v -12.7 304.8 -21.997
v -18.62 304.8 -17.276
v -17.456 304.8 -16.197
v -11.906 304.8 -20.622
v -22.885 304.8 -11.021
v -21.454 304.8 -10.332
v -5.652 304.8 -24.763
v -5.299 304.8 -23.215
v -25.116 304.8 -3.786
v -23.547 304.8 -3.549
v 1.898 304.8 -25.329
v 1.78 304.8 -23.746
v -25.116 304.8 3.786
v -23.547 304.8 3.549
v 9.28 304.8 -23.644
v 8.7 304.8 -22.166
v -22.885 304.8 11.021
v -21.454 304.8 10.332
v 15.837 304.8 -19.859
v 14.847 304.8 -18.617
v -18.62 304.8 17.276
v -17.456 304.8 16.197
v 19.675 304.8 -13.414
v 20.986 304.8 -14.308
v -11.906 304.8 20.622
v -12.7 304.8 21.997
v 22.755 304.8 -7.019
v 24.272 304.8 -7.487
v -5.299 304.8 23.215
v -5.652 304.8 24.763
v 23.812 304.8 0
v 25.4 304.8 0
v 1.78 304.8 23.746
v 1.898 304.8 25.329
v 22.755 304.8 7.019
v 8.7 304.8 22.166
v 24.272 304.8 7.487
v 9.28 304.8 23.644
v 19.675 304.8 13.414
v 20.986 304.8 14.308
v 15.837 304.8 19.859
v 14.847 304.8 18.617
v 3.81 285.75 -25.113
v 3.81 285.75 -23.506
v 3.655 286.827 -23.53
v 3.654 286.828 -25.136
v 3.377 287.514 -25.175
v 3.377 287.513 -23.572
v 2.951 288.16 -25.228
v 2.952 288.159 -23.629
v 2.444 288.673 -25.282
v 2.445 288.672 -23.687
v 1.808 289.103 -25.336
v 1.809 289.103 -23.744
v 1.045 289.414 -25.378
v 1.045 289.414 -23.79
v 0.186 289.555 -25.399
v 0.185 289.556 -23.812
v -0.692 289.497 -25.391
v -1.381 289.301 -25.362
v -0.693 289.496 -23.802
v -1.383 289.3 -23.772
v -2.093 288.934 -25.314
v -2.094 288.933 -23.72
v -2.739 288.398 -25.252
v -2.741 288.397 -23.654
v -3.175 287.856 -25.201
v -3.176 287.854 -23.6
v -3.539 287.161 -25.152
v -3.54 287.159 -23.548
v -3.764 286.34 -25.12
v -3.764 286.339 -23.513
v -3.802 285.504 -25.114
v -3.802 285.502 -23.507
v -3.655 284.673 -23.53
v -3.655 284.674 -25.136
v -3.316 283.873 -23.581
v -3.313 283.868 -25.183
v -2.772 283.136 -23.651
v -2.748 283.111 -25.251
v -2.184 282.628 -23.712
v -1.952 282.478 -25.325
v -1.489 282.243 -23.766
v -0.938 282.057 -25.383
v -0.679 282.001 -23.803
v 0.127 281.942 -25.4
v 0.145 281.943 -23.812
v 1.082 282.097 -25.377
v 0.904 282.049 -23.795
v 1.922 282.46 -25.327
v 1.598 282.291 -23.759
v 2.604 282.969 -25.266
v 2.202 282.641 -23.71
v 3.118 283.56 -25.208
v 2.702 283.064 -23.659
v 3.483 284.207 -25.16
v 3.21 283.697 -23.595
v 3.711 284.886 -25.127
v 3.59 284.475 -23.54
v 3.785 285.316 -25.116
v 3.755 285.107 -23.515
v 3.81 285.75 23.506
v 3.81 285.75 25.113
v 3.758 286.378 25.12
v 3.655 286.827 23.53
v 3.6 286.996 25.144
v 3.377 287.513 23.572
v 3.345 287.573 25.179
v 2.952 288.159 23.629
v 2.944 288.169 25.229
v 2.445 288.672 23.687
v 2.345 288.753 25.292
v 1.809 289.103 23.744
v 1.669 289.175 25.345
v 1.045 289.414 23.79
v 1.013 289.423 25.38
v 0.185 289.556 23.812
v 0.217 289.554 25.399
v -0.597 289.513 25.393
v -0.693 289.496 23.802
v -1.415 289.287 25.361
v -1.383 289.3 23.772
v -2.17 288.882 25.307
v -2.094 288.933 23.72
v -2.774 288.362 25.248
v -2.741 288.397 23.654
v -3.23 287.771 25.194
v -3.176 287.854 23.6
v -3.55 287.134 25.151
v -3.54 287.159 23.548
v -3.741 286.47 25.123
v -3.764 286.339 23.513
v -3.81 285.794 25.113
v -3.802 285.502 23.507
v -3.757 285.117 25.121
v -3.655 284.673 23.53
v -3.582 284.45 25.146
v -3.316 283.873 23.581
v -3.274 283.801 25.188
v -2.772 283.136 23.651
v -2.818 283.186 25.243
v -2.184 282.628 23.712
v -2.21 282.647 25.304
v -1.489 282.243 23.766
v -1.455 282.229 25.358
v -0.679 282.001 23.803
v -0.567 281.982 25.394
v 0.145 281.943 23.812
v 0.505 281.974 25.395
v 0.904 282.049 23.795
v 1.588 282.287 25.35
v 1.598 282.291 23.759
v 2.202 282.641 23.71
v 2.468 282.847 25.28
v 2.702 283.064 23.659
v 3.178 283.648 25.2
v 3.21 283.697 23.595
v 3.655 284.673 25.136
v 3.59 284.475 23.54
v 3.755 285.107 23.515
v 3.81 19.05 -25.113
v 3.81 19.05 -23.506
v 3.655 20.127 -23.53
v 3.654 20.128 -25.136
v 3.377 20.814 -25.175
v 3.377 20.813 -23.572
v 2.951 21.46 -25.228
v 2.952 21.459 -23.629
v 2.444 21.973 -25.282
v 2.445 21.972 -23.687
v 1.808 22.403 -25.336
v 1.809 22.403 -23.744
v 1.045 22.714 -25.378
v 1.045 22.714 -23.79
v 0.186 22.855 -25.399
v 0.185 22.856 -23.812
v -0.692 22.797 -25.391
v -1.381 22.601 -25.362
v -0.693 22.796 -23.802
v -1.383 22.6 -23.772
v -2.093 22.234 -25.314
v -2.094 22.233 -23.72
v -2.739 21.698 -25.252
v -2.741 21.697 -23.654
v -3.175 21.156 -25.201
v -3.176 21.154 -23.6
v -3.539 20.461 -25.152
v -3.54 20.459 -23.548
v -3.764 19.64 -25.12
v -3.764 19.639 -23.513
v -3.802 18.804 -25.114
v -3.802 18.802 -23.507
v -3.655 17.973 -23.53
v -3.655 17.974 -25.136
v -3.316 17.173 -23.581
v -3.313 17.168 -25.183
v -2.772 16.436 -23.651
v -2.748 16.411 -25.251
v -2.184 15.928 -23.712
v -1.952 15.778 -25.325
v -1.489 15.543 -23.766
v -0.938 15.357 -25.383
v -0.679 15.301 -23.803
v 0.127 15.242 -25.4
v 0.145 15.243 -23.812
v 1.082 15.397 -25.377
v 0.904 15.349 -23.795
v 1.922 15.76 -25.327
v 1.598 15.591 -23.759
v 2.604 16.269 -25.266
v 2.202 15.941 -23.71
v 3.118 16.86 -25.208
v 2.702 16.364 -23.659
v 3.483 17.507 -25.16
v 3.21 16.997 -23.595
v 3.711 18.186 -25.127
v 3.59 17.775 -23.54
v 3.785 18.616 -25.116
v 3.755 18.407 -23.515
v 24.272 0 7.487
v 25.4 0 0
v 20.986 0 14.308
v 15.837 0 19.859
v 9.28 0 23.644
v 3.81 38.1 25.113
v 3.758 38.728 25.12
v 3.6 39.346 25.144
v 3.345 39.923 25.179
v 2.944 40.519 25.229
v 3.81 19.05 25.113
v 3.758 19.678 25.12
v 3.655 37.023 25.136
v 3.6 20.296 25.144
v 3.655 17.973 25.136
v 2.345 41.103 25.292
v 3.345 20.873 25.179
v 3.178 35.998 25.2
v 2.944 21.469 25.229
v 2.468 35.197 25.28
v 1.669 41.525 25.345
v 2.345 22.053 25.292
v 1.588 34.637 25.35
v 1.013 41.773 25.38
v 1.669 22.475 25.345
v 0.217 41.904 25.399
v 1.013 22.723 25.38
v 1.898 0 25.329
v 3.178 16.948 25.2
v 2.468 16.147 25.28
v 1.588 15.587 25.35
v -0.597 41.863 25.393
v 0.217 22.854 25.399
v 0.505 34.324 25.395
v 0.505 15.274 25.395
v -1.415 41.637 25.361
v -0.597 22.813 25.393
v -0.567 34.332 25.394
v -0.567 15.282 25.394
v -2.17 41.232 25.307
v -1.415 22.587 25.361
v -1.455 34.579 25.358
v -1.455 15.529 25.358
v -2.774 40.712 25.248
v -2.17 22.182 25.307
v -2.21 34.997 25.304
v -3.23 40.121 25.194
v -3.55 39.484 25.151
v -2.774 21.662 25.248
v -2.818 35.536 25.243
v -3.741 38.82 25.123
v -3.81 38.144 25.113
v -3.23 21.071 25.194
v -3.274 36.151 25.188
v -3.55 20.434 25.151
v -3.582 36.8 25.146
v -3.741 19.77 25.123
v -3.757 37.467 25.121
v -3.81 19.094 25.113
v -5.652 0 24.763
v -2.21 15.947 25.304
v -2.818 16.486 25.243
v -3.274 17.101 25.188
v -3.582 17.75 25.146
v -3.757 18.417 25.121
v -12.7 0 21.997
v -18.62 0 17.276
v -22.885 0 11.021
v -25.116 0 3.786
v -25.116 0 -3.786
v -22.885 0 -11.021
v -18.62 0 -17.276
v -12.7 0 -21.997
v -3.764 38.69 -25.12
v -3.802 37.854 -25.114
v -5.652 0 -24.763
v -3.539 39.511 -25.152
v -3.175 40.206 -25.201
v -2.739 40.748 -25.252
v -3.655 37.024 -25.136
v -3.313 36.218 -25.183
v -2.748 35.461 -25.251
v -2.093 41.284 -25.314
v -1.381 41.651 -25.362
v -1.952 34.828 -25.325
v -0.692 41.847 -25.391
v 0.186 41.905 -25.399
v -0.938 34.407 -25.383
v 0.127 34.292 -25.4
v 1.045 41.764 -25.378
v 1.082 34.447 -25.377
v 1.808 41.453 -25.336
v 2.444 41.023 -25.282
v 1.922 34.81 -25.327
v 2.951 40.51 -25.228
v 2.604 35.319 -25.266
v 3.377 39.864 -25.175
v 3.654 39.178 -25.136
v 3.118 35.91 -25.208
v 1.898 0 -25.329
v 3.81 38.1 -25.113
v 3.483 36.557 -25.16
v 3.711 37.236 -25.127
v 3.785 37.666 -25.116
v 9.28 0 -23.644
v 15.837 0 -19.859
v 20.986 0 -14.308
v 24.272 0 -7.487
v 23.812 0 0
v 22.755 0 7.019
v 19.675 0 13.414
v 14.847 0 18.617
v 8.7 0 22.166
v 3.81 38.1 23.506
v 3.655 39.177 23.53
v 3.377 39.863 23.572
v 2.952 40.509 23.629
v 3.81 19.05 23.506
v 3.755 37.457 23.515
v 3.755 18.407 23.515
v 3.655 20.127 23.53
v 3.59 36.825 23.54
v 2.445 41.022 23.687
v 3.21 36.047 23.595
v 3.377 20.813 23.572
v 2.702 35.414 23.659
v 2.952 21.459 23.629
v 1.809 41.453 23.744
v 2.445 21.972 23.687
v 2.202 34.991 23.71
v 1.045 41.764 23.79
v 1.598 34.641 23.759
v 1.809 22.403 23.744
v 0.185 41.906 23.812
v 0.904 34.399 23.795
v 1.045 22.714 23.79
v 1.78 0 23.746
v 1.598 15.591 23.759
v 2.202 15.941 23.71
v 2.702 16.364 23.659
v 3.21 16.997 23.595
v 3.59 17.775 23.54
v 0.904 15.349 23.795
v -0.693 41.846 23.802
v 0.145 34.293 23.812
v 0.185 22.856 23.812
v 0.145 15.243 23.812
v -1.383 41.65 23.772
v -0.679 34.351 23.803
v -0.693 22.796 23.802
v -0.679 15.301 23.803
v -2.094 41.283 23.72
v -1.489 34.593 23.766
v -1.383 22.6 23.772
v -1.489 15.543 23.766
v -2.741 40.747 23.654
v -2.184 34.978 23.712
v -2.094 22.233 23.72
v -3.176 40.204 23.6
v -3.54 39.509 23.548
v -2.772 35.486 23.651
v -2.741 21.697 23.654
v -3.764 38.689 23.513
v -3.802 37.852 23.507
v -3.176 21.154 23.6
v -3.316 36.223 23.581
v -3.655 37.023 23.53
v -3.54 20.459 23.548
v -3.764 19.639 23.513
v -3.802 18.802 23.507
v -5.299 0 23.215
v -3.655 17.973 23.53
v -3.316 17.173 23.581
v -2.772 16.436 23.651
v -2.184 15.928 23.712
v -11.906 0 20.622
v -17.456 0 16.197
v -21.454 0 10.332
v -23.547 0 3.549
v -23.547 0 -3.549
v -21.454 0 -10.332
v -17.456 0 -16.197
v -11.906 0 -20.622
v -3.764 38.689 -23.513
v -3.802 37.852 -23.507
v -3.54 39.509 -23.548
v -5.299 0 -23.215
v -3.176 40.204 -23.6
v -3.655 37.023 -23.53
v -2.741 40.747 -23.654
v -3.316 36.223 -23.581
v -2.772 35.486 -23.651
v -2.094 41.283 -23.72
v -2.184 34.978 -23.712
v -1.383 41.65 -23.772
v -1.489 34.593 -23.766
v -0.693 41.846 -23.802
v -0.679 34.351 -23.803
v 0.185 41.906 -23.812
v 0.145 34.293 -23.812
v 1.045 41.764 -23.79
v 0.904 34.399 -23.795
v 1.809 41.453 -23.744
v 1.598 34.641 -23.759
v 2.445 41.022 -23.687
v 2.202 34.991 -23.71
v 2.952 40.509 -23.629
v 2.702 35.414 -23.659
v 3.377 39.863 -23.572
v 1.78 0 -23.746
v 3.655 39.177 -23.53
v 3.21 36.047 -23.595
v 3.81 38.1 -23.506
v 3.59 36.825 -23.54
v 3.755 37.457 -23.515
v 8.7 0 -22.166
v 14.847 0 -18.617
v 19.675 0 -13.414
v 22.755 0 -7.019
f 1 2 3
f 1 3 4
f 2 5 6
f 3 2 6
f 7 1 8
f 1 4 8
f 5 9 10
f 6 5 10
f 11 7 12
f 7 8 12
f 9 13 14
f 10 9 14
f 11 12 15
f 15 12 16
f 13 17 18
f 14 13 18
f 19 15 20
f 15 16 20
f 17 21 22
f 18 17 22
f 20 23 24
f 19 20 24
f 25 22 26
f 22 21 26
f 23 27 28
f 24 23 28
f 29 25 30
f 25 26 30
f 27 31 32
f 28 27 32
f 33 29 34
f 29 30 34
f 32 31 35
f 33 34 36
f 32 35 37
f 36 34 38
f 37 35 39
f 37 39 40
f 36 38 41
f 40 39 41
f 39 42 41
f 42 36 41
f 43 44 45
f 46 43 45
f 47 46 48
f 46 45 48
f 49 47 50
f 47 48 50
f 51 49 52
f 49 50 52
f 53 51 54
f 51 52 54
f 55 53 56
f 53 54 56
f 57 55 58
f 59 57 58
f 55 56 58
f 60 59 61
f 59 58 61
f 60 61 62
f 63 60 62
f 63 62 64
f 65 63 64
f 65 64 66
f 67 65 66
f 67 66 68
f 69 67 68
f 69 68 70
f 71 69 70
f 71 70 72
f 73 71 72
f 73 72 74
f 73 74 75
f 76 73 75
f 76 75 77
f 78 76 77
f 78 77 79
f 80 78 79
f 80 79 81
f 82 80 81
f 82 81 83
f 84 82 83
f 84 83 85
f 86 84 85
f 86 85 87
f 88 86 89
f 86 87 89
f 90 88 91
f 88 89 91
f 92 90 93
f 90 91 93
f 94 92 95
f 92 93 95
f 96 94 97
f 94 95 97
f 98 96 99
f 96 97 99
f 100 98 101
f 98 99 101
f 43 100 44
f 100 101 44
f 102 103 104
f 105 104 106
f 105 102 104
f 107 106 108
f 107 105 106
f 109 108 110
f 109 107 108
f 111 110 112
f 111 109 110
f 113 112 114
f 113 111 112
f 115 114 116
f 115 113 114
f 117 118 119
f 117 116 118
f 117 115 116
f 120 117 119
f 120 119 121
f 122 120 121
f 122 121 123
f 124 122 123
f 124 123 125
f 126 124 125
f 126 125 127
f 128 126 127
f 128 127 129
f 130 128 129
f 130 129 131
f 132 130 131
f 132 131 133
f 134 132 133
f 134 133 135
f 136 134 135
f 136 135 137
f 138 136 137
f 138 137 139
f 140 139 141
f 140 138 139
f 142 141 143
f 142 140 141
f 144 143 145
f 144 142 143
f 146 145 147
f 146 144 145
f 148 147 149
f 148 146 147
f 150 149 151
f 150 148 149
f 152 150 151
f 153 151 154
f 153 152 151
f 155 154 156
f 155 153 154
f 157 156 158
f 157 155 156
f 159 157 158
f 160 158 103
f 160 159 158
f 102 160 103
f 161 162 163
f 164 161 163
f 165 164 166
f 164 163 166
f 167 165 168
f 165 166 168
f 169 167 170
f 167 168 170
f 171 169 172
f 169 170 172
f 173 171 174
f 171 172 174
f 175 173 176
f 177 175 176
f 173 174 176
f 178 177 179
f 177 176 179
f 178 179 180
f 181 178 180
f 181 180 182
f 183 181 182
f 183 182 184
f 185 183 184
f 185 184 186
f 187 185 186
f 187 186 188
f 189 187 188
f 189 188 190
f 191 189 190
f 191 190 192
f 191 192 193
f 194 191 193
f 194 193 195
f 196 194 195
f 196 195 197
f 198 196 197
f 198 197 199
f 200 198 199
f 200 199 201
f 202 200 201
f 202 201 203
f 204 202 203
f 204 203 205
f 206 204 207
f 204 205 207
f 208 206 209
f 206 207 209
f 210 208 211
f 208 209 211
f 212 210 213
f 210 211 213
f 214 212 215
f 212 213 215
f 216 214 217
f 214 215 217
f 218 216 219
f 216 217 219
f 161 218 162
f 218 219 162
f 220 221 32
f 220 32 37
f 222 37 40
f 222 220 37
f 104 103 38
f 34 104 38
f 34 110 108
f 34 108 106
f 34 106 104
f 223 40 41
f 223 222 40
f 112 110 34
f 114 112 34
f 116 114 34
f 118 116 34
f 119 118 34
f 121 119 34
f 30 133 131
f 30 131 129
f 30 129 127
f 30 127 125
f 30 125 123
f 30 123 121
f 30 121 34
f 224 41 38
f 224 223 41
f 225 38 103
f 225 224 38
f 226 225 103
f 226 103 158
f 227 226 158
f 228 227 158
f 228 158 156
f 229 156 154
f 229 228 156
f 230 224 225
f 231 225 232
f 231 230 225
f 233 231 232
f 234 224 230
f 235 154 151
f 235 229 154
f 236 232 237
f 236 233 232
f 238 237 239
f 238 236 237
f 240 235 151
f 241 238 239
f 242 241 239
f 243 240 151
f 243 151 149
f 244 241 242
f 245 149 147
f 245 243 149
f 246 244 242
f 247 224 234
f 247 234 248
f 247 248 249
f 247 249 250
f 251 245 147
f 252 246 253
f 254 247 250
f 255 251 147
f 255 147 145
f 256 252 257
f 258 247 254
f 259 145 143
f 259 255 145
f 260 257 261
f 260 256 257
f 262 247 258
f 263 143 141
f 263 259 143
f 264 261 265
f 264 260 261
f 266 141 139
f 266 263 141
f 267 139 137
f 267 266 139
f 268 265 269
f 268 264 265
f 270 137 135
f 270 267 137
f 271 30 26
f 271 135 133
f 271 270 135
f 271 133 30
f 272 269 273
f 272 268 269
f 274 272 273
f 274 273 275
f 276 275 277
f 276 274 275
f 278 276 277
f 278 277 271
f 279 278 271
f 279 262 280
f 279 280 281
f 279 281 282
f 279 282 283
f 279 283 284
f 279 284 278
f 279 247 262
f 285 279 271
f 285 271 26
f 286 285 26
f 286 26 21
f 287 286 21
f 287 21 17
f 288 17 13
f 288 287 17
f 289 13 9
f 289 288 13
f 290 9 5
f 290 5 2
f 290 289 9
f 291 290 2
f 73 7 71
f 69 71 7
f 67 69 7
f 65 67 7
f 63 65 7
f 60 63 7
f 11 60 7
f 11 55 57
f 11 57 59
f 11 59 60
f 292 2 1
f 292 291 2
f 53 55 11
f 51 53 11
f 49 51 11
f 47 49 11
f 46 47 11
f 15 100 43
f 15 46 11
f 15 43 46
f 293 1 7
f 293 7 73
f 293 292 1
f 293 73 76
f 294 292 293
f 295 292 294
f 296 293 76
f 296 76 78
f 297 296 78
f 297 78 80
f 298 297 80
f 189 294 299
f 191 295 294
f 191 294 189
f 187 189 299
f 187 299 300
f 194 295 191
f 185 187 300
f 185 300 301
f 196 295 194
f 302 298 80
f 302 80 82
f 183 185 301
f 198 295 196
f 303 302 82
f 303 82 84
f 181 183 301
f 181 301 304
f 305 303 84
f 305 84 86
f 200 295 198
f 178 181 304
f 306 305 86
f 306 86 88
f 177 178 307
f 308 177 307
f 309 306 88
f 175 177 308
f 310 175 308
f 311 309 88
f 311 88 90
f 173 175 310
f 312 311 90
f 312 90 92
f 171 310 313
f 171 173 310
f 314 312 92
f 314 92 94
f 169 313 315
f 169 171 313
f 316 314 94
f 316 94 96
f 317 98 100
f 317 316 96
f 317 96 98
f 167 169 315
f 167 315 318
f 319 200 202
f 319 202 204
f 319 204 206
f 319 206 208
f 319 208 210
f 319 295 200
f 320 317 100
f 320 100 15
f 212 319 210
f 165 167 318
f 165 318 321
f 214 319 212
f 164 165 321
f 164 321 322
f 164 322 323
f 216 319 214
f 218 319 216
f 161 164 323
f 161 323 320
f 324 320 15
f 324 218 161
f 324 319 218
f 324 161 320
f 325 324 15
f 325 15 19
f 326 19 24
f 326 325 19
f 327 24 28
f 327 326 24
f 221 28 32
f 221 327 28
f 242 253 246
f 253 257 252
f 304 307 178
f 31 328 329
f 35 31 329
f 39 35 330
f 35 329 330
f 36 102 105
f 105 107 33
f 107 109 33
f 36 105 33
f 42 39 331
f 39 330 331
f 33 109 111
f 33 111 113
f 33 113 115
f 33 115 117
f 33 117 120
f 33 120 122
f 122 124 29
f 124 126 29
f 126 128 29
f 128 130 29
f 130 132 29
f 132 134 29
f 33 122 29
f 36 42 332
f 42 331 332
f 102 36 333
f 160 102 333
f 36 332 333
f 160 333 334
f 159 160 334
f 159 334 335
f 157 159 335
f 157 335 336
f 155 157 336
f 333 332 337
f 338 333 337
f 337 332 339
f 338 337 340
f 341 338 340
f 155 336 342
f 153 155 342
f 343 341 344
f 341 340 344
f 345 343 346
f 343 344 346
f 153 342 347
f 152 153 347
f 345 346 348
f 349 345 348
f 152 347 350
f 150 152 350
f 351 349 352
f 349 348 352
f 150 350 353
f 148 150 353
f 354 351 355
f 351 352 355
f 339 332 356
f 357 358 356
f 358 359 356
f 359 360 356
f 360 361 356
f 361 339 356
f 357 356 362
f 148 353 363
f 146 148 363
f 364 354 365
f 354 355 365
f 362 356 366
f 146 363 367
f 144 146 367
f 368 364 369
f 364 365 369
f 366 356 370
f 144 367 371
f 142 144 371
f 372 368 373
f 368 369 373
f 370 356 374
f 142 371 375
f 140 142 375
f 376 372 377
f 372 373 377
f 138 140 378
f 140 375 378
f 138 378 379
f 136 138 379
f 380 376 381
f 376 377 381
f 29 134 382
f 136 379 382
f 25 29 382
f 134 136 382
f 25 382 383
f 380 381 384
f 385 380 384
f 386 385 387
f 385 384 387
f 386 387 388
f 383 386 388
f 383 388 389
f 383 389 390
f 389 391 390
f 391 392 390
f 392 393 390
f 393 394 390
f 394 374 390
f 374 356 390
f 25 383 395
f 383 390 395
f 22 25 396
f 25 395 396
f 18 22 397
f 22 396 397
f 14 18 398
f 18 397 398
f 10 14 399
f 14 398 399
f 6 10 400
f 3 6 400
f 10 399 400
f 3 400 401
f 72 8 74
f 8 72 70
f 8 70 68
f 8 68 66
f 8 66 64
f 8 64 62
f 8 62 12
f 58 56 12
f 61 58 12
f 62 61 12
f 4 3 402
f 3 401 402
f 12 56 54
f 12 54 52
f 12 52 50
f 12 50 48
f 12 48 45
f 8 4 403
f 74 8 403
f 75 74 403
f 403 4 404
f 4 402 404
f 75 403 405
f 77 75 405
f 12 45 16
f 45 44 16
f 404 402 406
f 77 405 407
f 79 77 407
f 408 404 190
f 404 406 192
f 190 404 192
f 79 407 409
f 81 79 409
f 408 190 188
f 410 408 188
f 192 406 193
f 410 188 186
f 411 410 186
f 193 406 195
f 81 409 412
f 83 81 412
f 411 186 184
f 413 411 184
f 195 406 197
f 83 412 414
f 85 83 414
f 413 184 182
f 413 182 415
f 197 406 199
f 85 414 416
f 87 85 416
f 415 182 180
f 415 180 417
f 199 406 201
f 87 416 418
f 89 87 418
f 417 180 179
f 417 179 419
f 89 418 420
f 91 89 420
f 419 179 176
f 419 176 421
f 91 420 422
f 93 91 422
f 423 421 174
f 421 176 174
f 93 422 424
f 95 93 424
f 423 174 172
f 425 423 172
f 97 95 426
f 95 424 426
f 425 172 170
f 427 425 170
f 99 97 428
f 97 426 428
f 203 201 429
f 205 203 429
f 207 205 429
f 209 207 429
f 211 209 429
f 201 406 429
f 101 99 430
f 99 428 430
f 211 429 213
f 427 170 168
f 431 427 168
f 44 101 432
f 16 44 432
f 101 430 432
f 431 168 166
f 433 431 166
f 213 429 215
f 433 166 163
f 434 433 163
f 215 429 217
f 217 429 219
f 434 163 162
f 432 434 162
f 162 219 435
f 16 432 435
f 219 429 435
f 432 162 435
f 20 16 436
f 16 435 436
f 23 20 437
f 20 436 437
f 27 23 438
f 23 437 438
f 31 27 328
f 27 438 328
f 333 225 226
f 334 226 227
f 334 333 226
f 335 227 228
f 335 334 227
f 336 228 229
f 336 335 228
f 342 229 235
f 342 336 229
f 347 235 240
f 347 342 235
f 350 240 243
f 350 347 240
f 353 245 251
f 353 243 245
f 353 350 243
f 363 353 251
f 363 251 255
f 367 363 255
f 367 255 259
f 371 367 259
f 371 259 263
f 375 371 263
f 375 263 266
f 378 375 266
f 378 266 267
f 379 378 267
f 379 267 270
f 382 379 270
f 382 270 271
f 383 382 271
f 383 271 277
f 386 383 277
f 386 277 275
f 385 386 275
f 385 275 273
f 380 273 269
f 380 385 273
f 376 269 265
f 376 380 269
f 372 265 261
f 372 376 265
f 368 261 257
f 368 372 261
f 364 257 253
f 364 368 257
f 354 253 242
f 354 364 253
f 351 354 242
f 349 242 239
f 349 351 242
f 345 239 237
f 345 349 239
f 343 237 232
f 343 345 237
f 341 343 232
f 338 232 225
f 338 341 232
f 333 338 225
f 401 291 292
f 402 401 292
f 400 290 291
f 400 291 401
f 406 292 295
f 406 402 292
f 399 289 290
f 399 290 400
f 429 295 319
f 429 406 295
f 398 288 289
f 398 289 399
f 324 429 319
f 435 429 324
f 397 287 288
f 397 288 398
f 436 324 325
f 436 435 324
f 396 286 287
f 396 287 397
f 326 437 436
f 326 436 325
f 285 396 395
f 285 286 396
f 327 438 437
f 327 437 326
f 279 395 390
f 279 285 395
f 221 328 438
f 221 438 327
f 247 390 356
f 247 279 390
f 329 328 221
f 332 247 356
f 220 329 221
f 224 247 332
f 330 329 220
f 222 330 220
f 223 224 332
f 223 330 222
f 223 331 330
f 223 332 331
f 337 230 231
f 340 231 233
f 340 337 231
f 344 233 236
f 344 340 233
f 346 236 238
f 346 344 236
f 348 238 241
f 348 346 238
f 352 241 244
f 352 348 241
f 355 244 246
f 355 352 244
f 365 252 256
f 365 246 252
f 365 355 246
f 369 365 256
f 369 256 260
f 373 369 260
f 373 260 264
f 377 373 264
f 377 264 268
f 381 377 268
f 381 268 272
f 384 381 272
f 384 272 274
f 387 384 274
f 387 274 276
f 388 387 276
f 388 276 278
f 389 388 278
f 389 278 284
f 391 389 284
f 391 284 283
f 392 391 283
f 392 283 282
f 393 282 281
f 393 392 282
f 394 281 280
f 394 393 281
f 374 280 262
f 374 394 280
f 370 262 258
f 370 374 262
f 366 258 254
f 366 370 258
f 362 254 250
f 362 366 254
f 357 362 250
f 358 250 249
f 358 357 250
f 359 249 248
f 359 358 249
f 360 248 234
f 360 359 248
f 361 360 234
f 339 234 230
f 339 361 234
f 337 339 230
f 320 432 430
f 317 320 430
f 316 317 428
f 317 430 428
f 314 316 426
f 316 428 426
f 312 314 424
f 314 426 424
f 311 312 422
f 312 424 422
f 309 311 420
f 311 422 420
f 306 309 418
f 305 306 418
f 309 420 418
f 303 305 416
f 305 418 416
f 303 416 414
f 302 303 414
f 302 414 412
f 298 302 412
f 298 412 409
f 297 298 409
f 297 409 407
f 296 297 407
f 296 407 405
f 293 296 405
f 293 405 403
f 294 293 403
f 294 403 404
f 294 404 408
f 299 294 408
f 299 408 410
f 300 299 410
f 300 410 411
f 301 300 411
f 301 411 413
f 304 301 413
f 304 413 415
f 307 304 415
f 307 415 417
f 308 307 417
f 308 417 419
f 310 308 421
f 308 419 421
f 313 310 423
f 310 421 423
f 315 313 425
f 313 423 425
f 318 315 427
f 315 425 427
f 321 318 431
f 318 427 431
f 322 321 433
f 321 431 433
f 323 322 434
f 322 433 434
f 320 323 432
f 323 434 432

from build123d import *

# Parameters (mm, degrees)
F0_R          = 25.4
F0_R_2        = 23.8125
F1_DEPTH      = 304.8
F3_R          = 3.81
F4_DEPTH      = 25.4
F4_DEPTH_BACK = 25.4


with BuildPart() as f1:
    # F0 (on Front) → F1 (new body)
    with BuildSketch(Plane.XZ):
        Circle(F0_R)
        Circle(F0_R_2, mode=Mode.SUBTRACT)
    extrude(amount=-F1_DEPTH)

    # F3 (on Top) → F4 (cut, two sides)
    with BuildSketch(Plane.XY) as f4_sk:
        with Locations((0, 19.05)):
            Circle(F3_R)
        with Locations((0, 285.75)):
            Circle(F3_R)
        with Locations((0, 38.1)):
            Circle(F3_R)
    extrude(amount=F4_DEPTH, mode=Mode.SUBTRACT)
    extrude(f4_sk.sketch, amount=-F4_DEPTH_BACK, mode=Mode.SUBTRACT)


solid = f1.part
